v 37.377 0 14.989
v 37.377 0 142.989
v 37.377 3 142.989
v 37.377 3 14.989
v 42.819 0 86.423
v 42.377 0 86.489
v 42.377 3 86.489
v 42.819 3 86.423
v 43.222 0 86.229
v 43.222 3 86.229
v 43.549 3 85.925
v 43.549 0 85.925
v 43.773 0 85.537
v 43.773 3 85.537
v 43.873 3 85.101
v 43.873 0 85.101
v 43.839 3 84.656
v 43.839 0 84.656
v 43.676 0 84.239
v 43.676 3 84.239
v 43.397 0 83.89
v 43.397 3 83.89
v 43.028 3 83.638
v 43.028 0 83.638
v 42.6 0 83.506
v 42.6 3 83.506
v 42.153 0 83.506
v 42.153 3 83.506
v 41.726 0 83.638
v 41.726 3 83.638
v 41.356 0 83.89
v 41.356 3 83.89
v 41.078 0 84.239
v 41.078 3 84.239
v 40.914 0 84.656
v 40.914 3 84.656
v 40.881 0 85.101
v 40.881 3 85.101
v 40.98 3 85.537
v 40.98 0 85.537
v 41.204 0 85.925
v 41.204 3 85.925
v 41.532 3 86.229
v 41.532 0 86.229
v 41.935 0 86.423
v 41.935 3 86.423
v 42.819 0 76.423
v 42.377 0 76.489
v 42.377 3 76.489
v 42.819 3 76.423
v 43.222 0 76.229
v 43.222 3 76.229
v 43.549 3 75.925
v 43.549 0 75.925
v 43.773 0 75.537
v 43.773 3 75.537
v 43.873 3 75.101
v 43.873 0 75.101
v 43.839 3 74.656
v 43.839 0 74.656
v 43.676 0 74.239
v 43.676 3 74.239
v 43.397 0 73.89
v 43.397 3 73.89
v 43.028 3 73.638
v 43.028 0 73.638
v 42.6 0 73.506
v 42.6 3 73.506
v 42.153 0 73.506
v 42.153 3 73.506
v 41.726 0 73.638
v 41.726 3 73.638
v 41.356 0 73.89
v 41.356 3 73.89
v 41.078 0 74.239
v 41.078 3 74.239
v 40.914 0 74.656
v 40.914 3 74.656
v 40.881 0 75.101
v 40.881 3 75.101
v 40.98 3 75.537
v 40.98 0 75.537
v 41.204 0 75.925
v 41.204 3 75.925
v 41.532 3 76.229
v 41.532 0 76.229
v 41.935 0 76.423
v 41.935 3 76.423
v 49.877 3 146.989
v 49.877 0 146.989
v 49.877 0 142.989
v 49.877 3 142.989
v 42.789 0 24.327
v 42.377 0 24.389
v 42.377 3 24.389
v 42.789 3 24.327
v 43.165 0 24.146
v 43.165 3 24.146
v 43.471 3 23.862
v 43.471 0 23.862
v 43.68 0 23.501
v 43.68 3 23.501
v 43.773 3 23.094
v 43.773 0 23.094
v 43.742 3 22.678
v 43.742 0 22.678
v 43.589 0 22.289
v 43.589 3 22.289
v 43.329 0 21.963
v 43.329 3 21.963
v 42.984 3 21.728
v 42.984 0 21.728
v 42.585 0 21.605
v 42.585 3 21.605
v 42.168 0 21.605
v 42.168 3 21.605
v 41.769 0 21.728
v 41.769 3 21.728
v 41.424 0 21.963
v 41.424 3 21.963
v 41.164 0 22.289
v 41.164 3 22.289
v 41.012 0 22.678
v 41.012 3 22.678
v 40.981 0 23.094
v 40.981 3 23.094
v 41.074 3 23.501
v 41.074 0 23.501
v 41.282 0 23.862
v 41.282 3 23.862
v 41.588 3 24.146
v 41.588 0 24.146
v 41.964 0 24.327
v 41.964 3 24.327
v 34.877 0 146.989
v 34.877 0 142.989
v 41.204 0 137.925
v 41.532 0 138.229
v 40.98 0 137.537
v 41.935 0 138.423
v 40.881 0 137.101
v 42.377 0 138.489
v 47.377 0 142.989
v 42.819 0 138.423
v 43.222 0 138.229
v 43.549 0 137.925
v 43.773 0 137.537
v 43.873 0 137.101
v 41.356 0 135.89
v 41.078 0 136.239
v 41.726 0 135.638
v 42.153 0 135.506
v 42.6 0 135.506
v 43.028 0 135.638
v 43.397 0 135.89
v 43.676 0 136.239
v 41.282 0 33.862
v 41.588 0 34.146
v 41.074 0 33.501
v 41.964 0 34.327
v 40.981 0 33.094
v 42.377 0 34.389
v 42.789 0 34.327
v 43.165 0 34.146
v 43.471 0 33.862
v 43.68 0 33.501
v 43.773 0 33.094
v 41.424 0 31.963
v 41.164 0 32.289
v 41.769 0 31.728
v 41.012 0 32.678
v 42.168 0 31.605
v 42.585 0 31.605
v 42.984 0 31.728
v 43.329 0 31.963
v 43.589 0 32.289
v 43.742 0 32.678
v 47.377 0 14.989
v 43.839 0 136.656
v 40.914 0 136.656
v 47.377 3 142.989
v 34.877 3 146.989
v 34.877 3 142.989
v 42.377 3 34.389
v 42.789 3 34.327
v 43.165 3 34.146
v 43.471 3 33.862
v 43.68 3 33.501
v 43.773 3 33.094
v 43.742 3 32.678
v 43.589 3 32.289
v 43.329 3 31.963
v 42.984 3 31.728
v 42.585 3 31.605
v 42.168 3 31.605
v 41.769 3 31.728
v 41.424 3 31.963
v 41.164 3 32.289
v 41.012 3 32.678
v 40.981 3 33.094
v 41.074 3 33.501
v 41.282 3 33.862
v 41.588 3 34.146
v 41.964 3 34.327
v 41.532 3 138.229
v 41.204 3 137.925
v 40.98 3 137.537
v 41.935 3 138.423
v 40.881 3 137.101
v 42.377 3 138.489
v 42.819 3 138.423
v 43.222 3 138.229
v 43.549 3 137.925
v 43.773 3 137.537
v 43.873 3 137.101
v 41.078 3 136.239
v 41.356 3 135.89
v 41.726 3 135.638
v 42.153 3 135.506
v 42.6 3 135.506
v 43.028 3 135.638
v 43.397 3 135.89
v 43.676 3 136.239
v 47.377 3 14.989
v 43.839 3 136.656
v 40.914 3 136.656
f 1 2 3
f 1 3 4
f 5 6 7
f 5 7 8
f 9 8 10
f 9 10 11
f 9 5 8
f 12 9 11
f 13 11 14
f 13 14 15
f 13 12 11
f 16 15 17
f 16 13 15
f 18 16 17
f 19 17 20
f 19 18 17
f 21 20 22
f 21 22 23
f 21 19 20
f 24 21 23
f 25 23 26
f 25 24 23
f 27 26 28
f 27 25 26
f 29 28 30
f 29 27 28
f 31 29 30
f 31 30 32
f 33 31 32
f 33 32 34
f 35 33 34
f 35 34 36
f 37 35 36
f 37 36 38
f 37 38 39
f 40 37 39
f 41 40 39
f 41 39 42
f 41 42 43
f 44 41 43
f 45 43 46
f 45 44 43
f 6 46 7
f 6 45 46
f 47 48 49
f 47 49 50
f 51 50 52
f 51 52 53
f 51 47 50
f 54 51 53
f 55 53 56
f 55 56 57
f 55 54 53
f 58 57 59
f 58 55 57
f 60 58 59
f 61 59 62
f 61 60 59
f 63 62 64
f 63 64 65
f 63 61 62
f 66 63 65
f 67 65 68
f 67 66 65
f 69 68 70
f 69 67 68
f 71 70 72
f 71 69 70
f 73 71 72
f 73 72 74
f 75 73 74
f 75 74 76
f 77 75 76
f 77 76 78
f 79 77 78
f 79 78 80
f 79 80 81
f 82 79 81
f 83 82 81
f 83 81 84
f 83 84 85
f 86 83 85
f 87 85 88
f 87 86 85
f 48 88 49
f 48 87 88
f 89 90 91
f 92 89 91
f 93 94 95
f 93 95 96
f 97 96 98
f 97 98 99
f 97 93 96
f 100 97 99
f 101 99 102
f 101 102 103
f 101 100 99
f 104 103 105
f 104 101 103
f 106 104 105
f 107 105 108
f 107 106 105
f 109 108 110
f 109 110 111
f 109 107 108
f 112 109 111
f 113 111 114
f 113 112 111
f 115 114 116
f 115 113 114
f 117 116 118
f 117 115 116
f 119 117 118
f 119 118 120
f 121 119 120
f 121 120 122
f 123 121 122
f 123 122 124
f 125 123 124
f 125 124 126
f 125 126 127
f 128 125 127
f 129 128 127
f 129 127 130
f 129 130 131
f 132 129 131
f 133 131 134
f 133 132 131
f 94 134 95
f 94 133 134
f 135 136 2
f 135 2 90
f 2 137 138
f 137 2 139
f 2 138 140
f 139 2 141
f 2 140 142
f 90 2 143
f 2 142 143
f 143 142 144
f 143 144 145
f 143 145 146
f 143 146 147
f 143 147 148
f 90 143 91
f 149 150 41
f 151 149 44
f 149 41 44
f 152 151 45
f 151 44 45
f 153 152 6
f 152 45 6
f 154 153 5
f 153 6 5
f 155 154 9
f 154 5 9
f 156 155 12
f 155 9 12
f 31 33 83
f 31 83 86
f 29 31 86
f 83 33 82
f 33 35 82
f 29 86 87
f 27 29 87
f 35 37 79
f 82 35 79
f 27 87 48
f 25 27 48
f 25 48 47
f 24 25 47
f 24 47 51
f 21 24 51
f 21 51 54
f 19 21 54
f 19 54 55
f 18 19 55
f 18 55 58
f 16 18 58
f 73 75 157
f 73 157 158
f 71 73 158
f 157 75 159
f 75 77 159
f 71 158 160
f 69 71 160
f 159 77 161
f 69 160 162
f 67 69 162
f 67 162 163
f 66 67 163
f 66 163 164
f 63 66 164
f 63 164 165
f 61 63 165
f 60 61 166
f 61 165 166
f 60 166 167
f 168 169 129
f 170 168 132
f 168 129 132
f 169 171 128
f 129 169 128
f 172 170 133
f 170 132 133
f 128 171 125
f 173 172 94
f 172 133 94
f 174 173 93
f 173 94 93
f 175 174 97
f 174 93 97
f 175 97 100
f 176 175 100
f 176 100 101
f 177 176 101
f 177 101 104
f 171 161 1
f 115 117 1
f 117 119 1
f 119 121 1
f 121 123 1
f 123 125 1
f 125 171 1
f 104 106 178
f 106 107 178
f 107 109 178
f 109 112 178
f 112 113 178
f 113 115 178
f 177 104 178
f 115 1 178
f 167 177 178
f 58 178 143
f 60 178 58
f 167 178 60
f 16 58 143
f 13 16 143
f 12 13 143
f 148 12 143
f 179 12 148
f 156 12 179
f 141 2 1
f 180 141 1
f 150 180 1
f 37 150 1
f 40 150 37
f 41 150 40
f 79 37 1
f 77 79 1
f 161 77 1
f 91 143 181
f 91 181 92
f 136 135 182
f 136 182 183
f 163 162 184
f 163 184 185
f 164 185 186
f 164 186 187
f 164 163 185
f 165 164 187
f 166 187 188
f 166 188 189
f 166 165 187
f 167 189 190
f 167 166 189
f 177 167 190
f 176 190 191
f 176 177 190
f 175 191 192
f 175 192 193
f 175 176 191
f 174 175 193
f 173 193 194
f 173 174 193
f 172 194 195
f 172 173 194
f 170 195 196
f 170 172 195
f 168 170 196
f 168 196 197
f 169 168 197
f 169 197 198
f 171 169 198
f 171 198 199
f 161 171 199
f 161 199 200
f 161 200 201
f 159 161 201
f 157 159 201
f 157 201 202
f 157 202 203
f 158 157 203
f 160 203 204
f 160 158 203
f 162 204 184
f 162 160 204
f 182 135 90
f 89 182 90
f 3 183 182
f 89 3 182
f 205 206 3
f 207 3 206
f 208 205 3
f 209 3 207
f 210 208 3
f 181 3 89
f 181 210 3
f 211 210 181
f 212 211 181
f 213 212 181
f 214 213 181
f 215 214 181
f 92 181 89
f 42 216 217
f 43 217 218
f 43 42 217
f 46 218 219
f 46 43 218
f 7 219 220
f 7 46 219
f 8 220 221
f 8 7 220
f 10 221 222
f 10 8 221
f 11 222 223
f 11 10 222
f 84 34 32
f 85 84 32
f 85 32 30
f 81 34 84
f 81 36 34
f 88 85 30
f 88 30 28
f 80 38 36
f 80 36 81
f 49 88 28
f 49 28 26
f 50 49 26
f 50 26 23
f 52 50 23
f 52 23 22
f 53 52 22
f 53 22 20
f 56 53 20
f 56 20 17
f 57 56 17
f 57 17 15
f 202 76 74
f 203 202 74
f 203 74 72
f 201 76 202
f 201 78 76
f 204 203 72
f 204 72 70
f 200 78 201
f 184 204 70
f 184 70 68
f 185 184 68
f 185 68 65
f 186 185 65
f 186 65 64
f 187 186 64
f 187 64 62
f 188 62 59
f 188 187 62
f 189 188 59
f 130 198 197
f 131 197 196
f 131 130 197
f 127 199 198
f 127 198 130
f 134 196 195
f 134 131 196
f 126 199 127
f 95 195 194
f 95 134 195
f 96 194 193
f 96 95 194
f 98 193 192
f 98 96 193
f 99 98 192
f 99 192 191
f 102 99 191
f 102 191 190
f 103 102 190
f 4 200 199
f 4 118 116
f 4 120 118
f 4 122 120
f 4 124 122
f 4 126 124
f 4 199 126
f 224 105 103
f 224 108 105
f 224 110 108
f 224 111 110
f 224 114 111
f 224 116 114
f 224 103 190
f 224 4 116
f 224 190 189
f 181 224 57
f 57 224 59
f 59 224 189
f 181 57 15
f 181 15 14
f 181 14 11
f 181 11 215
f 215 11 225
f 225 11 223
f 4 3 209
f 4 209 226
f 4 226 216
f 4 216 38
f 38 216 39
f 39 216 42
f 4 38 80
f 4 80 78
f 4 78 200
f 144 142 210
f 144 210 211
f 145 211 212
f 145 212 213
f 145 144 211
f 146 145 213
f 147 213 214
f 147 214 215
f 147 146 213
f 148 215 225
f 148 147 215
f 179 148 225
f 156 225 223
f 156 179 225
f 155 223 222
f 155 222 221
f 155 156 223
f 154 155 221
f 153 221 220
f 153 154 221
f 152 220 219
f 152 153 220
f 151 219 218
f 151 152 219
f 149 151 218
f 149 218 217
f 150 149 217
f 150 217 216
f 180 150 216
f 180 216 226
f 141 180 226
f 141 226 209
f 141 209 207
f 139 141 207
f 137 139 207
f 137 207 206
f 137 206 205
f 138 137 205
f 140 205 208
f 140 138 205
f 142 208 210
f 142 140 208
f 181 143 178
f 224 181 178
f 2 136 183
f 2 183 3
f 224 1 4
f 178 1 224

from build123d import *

# Parameters (mm, degrees)
SKETCH1_W           = 15
SKETCH1_H           = 4
SKETCH1_W_2         = 10
SKETCH1_H_2         = 128
SKETCH1_R           = 1.4
SKETCH1_R_2         = 1.5
BOSS_EXTRUDE1_DEPTH = 3


with BuildPart() as part:
    # Sketch1 → Boss-Extrude1 (new body)
    # profile 1 of 2: a face of its own
    with BuildSketch(Plane(origin=(0, 0, 0), x_dir=(1, 0, 0), z_dir=(0, 1, 0))):
        with Locations((42.376726578, -144.989284628)):
            Rectangle(SKETCH1_W, SKETCH1_H)
    # profile 2 of 2: a face of its own
    with BuildSketch(Plane(origin=(0, 0, 0), x_dir=(1, 0, 0), z_dir=(0, 1, 0))):
        with Locations((42.376726578, -78.989284628)):
            Rectangle(SKETCH1_W_2, SKETCH1_H_2)
        with Locations(Location((42.376726578, -22.989284628, 0), (0, 0, 270))):
            Circle(SKETCH1_R, mode=Mode.SUBTRACT)
        with Locations(Location((42.376726578, -32.989284628, 0), (0, 0, 270))):
            Circle(SKETCH1_R, mode=Mode.SUBTRACT)
        with Locations(Location((42.376726578, -136.989284628, 0), (0, 0, 270))):
            Circle(SKETCH1_R_2, mode=Mode.SUBTRACT)
        with Locations(Location((42.376726578, -84.989284628, 0), (0, 0, 270))):
            Circle(SKETCH1_R_2, mode=Mode.SUBTRACT)
        with Locations(Location((42.376726578, -74.989284628, 0), (0, 0, 270))):
            Circle(SKETCH1_R_2, mode=Mode.SUBTRACT)
    extrude(amount=BOSS_EXTRUDE1_DEPTH)


solid = part.part
